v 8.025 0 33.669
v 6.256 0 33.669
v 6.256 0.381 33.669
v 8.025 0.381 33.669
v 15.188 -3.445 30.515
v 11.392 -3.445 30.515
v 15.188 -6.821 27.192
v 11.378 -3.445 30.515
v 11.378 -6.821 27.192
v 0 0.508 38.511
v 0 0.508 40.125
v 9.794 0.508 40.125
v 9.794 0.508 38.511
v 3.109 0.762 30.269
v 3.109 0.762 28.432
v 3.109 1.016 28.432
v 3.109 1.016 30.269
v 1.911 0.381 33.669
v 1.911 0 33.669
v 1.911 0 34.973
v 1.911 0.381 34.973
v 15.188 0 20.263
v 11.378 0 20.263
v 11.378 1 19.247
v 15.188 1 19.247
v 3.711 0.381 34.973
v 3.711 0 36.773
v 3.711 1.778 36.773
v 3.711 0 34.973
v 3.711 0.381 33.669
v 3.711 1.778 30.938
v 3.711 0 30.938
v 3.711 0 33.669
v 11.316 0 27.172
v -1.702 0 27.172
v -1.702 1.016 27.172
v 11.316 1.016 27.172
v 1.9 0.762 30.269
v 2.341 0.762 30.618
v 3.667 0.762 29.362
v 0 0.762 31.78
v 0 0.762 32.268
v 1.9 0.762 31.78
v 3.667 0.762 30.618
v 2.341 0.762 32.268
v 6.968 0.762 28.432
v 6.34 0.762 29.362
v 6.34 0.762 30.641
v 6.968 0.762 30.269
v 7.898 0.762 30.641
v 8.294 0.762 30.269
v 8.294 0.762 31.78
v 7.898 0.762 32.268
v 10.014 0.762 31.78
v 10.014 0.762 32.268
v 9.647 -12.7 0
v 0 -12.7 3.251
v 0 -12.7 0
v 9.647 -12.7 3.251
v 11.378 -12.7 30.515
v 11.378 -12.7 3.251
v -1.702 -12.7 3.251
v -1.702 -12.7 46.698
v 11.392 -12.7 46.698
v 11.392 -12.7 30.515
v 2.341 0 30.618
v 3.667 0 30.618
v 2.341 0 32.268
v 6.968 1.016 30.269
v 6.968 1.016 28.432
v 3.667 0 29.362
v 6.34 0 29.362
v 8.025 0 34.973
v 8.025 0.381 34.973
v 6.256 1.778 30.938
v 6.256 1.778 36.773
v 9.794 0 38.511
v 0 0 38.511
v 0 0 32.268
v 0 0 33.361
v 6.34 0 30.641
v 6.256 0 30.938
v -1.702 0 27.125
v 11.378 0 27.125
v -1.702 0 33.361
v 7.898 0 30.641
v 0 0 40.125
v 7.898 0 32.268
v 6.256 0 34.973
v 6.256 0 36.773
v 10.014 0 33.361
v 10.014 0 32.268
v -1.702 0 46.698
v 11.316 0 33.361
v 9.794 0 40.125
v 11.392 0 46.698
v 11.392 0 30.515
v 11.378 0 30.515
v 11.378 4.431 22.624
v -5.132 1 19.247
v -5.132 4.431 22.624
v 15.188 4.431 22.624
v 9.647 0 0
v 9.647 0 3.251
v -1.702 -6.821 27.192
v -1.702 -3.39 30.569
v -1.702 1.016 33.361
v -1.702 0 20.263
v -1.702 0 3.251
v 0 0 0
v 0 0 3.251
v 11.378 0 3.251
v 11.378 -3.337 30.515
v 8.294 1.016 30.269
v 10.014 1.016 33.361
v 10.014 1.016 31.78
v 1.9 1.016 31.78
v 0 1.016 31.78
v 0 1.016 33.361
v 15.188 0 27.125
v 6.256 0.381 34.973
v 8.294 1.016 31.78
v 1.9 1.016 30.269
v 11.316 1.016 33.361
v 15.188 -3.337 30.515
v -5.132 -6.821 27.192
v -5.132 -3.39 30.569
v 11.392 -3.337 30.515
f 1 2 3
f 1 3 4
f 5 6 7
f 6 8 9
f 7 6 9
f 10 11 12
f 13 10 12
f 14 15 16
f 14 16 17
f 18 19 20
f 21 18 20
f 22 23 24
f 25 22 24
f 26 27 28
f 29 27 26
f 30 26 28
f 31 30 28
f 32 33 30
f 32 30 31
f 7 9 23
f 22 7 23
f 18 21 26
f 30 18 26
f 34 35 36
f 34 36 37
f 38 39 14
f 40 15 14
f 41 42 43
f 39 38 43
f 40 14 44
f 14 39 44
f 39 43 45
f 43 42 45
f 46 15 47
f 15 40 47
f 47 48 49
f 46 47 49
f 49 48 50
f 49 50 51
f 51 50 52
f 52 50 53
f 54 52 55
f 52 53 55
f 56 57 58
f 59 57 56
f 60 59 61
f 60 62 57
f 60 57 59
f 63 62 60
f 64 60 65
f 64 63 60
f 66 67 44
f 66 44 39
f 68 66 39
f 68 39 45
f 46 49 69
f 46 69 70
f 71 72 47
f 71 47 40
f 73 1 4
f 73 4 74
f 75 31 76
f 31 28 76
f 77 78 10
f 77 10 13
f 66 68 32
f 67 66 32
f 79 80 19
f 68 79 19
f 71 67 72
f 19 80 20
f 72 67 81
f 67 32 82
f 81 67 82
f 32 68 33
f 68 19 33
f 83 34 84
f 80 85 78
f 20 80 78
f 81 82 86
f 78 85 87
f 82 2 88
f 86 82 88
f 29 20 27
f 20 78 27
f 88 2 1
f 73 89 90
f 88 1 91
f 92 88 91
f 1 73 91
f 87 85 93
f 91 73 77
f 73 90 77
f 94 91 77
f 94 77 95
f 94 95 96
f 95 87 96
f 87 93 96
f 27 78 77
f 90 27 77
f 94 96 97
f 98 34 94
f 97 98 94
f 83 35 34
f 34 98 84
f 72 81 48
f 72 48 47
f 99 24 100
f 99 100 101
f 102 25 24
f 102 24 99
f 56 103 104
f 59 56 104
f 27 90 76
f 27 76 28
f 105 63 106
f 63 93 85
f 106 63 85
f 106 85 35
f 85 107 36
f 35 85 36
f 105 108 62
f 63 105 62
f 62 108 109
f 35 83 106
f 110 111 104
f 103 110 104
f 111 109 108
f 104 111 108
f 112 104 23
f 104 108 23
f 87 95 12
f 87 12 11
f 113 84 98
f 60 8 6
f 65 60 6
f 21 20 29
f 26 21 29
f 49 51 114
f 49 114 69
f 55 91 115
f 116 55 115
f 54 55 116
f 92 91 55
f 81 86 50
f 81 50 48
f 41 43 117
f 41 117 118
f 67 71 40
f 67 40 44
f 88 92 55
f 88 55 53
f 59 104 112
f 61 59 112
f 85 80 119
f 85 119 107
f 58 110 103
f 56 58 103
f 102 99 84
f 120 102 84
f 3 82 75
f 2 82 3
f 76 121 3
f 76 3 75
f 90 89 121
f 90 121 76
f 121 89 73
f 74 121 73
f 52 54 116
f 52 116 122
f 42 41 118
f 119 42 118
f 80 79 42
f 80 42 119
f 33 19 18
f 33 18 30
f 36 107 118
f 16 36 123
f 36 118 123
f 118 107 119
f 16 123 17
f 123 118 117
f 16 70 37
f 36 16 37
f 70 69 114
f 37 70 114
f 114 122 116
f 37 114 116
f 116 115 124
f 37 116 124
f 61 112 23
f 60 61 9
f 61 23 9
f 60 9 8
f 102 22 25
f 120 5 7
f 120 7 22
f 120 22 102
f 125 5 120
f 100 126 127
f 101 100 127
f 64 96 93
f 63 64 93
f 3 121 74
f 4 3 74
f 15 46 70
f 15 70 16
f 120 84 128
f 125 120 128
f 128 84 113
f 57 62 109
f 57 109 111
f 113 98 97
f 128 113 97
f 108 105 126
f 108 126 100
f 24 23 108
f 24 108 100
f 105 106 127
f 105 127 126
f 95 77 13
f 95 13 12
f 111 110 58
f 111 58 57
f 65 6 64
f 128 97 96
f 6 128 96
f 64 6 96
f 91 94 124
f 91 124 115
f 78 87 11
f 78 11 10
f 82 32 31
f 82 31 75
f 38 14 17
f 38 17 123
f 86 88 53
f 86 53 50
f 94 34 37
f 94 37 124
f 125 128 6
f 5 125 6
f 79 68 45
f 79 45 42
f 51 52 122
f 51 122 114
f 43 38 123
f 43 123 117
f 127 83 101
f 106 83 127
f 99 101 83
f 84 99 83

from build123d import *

# Parameters (mm, degrees)
F0_W      = 9.647341
F0_H      = 3.250734
F2_DEPTH  = 12.7
F4_DEPTH  = 1.778
F5_DEPTH  = 0.508
F1_W      = 1.800112
F1_H      = 1.303531
F6_DEPTH  = 0.381
F1_W_2    = 1.769075
F7_DEPTH  = 0.381
F9_DEPTH  = 3.81
F10_DEPTH = 16.51
F12_DEPTH = 1.016
F13_DEPTH = 0.762


with BuildPart() as f2:
    # F0 (on Front) → F2 (new body)
    with BuildSketch(Plane.XZ):
        with Locations((4.82367, 1.625367)):
            Rectangle(F0_W, F0_H)
        Polygon((-1.701648, 3.250734), (0, 3.250734), (9.647341, 3.250734), (11.377569, 3.250734), (11.377569, 30.514956), (11.391672, 30.514956), (11.391672, 46.697617), (-1.701648, 46.697617), (-1.701648, 30.514956), align=None)
    extrude(amount=F2_DEPTH)

    # F1 (on face) → F4 (join)
    with BuildSketch(Plane.XZ):
        Polygon((3.710789, 33.669334), (3.710789, 30.938132), (6.255776, 30.938132), (6.255776, 33.669334), (6.255776, 34.972865), (6.255776, 36.772978), (3.710789, 36.772978), (3.710789, 34.972865), align=None)
    extrude(amount=-F4_DEPTH)

    # F1 (on face) → F5 (join)
    with BuildSketch(Plane.XZ):
        Polygon((1.855394, 38.511015), (3.710789, 38.511015), (6.255776, 38.511015), (8.024851, 38.511015), (9.793927, 38.511015), (9.793927, 40.124908), (0, 40.124908), (0, 38.511015), align=None)
    extrude(amount=-F5_DEPTH)

    # F1 (on face) → F6 (join)
    with BuildSketch(Plane.XZ):
        with Locations((2.810733, 34.3211)):
            Rectangle(F1_W, F1_H)
    extrude(amount=-F6_DEPTH)

    # F1 (on face) → F7 (join)
    with BuildSketch(Plane.XZ):
        with Locations((7.140313, 34.3211)):
            Rectangle(F1_W_2, F1_H)
    extrude(amount=-F7_DEPTH)

    # F8 (on face) → F9 (join)
    with BuildSketch(Plane.YZ.offset(11.377569)):
        Polygon((0, 27.125444), (-3.33655, 30.514956), (-3.445342, 30.514956), (-6.820974, 27.192068), (0, 20.262824), align=None)
        Polygon((4.431088, 22.624021), (0, 27.125444), (0, 20.262824), (1.000203, 19.246745), align=None)
    extrude(amount=F9_DEPTH)

    # F8 (on face) → F10 (join)
    with BuildSketch(Plane.YZ.offset(11.377569)):
        Polygon((4.431088, 22.624021), (-3.39009, 30.569345), (-6.820974, 27.192068), (1.000203, 19.246745), align=None)
    extrude(amount=-F10_DEPTH)

    # F11 (on face) → F12 (join)
    with BuildSketch(Plane.XZ):
        Polygon((0, 33.361174), (-1.701648, 33.361174), (-1.701648, 30.514956), (-1.701648, 27.172441), (11.316204, 27.172441), (11.316204, 33.361174), (10.014145, 33.361174), (10.014145, 32.268375), (10.014145, 31.780105), (8.293568, 31.780105), (8.293568, 30.268786), (6.968258, 30.268786), (6.968258, 28.431954), (3.108585, 28.431954), (3.108585, 30.268786), (1.899531, 30.268786), (1.899531, 31.780105), (0, 31.780105), (0, 32.268375), align=None)
    extrude(amount=-F12_DEPTH)

    # F11 (on face) → F13 (join)
    with BuildSketch(Plane.XZ):
        Polygon((2.341301, 32.268375), (0, 32.268375), (0, 31.780105), (1.899531, 31.780105), (1.899531, 30.268786), (3.108585, 30.268786), (3.108585, 28.431954), (6.968258, 28.431954), (6.968258, 30.268786), (8.293568, 30.268786), (8.293568, 31.780105), (10.014145, 31.780105), (10.014145, 32.268375), (7.8983, 32.268375), (7.8983, 30.640803), (6.34048, 30.640803), (6.34048, 29.361997), (3.66661, 29.361997), (3.66661, 30.617552), (2.341301, 30.617552), align=None)
    extrude(amount=-F13_DEPTH)


solid = f2.part
